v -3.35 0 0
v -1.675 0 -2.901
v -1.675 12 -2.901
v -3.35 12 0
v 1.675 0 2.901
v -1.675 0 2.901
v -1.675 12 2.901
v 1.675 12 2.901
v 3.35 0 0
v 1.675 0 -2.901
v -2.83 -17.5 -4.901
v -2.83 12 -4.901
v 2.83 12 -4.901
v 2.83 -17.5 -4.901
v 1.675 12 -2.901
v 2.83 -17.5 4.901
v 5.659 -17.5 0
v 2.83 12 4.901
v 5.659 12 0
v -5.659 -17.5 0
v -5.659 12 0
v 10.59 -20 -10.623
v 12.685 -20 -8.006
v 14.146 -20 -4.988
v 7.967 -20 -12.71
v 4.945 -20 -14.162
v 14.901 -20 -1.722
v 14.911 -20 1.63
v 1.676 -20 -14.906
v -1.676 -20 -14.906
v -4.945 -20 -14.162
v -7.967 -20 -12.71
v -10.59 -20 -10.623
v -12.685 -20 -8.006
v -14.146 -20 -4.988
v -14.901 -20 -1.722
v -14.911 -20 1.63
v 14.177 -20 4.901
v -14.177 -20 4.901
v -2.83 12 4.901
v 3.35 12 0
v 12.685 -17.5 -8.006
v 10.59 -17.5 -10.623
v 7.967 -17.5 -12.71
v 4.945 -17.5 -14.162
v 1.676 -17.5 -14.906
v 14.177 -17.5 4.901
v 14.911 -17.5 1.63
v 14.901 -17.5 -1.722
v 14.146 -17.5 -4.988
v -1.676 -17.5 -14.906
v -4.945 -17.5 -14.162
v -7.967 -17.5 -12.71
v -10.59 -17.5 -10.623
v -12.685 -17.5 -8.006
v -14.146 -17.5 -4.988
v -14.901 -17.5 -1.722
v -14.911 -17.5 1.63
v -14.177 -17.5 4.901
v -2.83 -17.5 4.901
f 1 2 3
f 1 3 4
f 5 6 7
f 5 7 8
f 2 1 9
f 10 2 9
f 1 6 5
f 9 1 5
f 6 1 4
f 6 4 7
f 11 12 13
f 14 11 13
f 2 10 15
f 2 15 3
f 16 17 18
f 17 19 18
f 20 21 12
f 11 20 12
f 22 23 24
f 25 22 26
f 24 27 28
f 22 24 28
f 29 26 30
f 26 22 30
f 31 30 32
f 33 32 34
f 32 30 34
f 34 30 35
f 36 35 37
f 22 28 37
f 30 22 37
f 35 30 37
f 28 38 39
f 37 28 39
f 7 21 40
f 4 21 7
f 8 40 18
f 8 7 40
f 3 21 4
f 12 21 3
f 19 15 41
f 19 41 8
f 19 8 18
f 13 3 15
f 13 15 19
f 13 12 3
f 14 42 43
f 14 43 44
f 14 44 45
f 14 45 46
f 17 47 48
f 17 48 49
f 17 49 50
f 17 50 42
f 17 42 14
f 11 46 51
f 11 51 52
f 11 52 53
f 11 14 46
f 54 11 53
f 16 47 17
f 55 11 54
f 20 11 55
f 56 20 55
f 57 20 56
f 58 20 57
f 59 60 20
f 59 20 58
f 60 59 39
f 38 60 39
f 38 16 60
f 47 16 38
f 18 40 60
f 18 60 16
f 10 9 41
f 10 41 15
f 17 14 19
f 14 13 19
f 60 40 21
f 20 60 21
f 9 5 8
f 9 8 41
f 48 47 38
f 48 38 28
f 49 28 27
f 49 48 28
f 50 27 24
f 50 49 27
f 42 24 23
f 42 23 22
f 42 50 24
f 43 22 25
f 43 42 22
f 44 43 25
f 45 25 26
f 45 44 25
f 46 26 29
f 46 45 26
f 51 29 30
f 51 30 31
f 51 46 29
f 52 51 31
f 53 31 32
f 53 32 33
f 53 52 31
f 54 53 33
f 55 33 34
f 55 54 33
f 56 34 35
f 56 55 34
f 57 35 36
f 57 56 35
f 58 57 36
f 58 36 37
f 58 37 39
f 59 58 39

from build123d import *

# Parameters (mm, degrees)
BOSS_EXTRUDE1_DEPTH = 12
BOSS_EXTRUDE2_DEPTH = 17.5
BOSS_EXTRUDE3_DEPTH = 2.5


with BuildPart() as part:
    # Sketch1 → Boss-Extrude1 (new body)
    with BuildSketch(Plane(origin=(0, 0, 0), x_dir=(1, 0, 0), z_dir=(0, 1, 0))):
        Polygon((-2.829700538, 4.901185103), (-5.659401077, 0), (-2.829700538, -4.901185103), (2.829700538, -4.901185103), (5.659401077, 0), (2.829700538, 4.901185103), align=None)
        Polygon((-1.675, 2.901185103), (-3.35, 0), (-1.675, -2.901185103), (1.675, -2.901185103), (3.35, 0), (1.675, 2.901185103), align=None, mode=Mode.SUBTRACT)
    extrude(amount=BOSS_EXTRUDE1_DEPTH)

    # Sketch2 → Boss-Extrude2 (add)
    with BuildSketch(Plane.XZ):
        Polygon((-2.829700538, -4.901185103), (2.829700538, -4.901185103), (5.659401077, 0), (2.829700538, 4.901185103), (-2.829700538, 4.901185103), (-5.659401077, 0), align=None)
    extrude(amount=BOSS_EXTRUDE2_DEPTH)

    # Sketch3 → Boss-Extrude3 (add)
    with BuildSketch(Plane.XZ.offset(17.5)):
        with BuildLine():
            Line((-14.176684542, 4.901185103), (14.176684542, 4.901185103))
            ThreePointArc((14.176684542, 4.901185103), (0, -15), (-14.176684542, 4.901185103))
        make_face()
    extrude(amount=BOSS_EXTRUDE3_DEPTH)


solid = part.part
